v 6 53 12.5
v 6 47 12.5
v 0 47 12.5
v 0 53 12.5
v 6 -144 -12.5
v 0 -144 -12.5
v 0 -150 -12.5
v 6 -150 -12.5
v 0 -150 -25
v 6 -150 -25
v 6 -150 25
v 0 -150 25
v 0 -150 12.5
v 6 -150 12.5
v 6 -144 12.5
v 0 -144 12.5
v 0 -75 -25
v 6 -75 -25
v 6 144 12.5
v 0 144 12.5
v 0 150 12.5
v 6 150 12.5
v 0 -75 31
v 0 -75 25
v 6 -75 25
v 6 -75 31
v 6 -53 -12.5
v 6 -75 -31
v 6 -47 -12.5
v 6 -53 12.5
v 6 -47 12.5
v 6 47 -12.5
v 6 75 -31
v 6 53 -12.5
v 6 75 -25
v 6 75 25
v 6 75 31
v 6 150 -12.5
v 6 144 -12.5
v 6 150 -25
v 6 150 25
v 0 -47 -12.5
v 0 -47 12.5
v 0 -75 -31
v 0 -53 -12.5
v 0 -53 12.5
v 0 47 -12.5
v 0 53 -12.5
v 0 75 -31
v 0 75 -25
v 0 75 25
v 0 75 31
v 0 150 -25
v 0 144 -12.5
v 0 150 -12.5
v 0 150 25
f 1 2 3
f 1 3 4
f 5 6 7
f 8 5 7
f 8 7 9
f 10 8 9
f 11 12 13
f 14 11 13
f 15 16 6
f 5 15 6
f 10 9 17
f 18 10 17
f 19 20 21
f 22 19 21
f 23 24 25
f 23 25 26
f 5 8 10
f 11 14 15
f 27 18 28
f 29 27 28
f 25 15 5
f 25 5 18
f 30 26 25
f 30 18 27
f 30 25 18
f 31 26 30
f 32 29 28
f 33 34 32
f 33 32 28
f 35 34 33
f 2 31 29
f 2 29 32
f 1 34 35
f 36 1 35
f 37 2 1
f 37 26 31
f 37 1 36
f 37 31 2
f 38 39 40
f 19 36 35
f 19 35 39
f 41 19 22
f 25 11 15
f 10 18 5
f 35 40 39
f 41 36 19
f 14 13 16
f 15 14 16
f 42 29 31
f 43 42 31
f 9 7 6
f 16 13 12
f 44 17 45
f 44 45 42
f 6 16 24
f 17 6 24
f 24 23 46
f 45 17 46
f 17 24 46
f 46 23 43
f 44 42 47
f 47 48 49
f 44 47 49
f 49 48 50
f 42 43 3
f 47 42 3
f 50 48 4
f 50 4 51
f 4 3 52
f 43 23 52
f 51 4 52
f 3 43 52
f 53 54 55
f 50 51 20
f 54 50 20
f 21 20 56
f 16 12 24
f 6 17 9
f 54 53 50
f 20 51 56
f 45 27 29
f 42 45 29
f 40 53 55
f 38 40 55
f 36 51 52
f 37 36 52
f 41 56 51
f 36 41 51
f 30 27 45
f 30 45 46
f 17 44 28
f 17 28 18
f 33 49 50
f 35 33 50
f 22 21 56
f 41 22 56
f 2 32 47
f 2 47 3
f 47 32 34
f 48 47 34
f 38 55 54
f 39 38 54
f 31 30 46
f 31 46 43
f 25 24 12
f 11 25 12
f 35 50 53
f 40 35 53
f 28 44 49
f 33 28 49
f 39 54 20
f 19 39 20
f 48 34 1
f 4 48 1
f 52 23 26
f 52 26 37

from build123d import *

# Parameters (mm, degrees)
F0_W     = 150
F0_H     = 6
F1_DEPTH = 6
F2_W     = 6
F2_H     = 25
F3_DEPTH = 6


with BuildPart() as f1:
    # F0 (on Right) → F1 (new body)
    with BuildSketch(Plane.YZ):
        Polygon((-75, 25), (-150, 25), (-150, 12.5), (-144, 12.5), (-144, -12.5), (-150, -12.5), (-150, -25), (-75, -25), (-75, -19), (75, -19), (75, -25), (150, -25), (150, -12.5), (144, -12.5), (144, 12.5), (150, 12.5), (150, 25), (75, 25), (75, 19), (-75, 19), align=None)
        with Locations((0, 28)):
            Rectangle(F0_W, F0_H)
        with Locations((0, 22)):
            Rectangle(F0_W, F0_H)
        with Locations((0, -28)):
            Rectangle(F0_W, F0_H)
        with Locations((0, -22)):
            Rectangle(F0_W, F0_H)
    extrude(amount=F1_DEPTH)

    # F2 (on face) → F3 (cut, through all)
    with BuildSketch(Plane.YZ.offset(6)):
        with Locations((-50, 0)):
            Rectangle(F2_W, F2_H)
        with Locations((50, 0)):
            Rectangle(F2_W, F2_H)
    extrude(amount=-F3_DEPTH, mode=Mode.SUBTRACT)


solid = f1.part
